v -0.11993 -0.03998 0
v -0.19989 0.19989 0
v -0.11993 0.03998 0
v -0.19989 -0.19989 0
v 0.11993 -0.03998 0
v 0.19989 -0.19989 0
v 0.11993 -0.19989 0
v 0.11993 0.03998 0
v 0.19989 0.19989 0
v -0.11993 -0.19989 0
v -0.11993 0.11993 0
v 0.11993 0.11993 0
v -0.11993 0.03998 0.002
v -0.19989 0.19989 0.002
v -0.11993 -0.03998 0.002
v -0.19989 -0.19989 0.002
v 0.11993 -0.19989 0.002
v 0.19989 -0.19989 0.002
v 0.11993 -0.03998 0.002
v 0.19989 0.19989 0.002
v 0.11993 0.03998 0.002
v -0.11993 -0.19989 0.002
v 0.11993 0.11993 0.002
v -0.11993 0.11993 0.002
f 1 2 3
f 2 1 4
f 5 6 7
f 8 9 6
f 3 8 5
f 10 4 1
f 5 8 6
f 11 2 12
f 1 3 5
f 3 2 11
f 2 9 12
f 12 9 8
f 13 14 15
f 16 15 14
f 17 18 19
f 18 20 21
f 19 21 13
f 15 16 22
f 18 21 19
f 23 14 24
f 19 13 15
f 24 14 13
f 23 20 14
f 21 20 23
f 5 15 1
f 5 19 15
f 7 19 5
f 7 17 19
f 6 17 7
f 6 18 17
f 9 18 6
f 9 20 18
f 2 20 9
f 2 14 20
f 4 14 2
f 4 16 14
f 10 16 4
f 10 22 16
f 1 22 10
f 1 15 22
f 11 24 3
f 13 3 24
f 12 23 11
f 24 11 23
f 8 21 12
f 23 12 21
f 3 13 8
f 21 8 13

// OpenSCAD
// file: text.scad
char_depth = 0.0001;

char_pixelsz = 0.02/5;
char_pheight = 5;
char_max_pwidth = 5;

function sum(list) = list * [for (_=list) 1];
function partialsum(list, end) = list * [for (i=[0:len(list)-1]) i < end ? 1 : 0];

module _Text_Line(a, b) {
  l = norm(b-a);
  f = l > 0 ? (b-a)/l : [1, 0];
  r = [f.y, -f.x];
  ea = -0.5*f;
  eb = (l+0.5)*f;
  sr = 0.5*r;
  sl = -sr;
  polygon([
    a+ea+sr,
    a+eb+sr,
    a+eb+sl,
    a+ea+sl,
  ]*char_pixelsz);
}

module _Text_Segments(pts, off=[0,0]) {
  for (i=[0:len(pts)-2]) {
    pa = pts[i];
    pb = pts[i+1];
    if (len(pa) == 2 && len(pb) == 2)
      _Text_Line(pts[i]+off, pts[i+1]+off);
  }
}

_Letters =
let(
  bl=[-2,-2],
  bc=[0,-2],
  br=[2,-2],
  cl=[-2,0],
  cc=[0,0],
  cr=[2,0],
  tl=[-2,2],
  tc=[0,2],
  tr=[2,2],
  _=[],
  hx=[0.5,0],
  hy=[0,0.5],
  x=[1,0],
  y=[0,1]
) [
  [bl, tl, tr, br, _, cl, cr], // A
  [cr+hy, br, bl, tl, tc+hx, _, cl, cr, _, tc+y, cr+x], // B
  [br, bl, tl, tr], // C
  [cr+hy, br, bl, tl, tc+hx, _, cr+x, tc+y], // D
  [br, bl, tl, tr, _, cl, cc], // E
  [tr, tl, bl, cl, cc], // F
  [cc, cr, br, bl, tl, tr], // G
  [bl, tl, cl, cr, tr, br], // H
  [bc, tc], // I
  [cl, bl, br, tr], // J
  [bl, tl, _, cl, cc, _, tr+hx+hy, cc, br+hx-hy], // K
  [tl, bl, br], // L
  [bl, tl, tr, br, _, bc, tc], // M
  [bl, tl, tr, br], // N
  [bl, tl, tr, br, bl], // O
  [bl, tl, tr, cr, cl], // P
  [bl, tl, tr, br, bl, _, cc+hx-hy, br], // Q
  [bl, tl, tr, cr, cl, bc+hx-hy], // R
  [bl, br, cr, cl, tl, tr], // S
  [tl, tr, _, bc, tc], // T
  [tl, bl, br, tr], // U
  [tl, cl, _, tr, cr, _, cl-x+hy, bc-hy, cr+x+hy], // V
  [tl, bl, br, tr, _, bc, tc], // W
  [bl-hx-hy, tr+hx+hy, _, tl-hx+hy, br+hx-hy], // X
  [tl, cl, cr, tr, _, bc, cc], // Y
  [br, bl+hx, _, bl-hx-hy, tr+hx+hy, _, tr-hx, tl], // Z
  [bl, tl, tr, br, bl, _, bl, tr], // 0
  [bc, tc, tc-x], // 1
  [tl, tr, cr, cl, bl, br], // 2
  [bl, br, tr, tl, _, cc, cr], // 3
  [tl, cl, cr, tr, br], // 4
  [tr, tl, cl, cr, cr-hy, _, cr+x, bc-y, _, bc+hx, bl], // 5
  [tr, tl, bl, br, cr, cl], // 6
  [tl, tr, br], // 7
  [bl, tl, tr, br, bl, cl, cr], // 8
  [br, tr, tl, cl, cr], // 9
  [tl, tr, cr, cc, _, bc, bc], // ? for missing
];

function _Letter_Lookup(c) =
  let(
    ci=ord(c),
    li=ci-ord("A"),
    ni=ci-ord("0"),
    issp=ci==32,
    lps=li>=0&&li<26 ? _Letters[li] : ni>=0&&ni<10 ? _Letters[ni+26] : [],
    lpf=len(lps)==0 ? _Letters[36] : lps
  ) issp ? [] : lpf;

function _Letter_Bounds(letter) =
  let(
    fletter = concat([[0, 0]], [for (l=letter) len(l)==2 ? l : [0,0]]),
    xs = [for (l=fletter) l.x],
    ys = [for (l=fletter) l.y],
    h_edge = (char_max_pwidth - 1) / 2,
    v_edge = (char_pheight - 1) / 2
  ) [
    max(min(xs), -h_edge),
    max(min(ys), -v_edge),
    min(max(xs), h_edge),
    min(max(ys), v_edge)
  ];

module Text(text) {
  letters = [for (c=text) _Letter_Lookup(c)];
  lbounds = [for (l=letters) _Letter_Bounds(l)];
  lwidths = [for (b=lbounds) min(b.z-b.x+1, char_max_pwidth)];
  lmins = [for (b=lbounds) b.x];
  twid = sum(lwidths) + len(letters)-1;
  startoff = (1-twid)/2;
  offs = [for (i=[0:len(letters)-1]) startoff+i+partialsum(lwidths, i)];
  linear_extrude(height=char_depth) {
    for (i=[0:len(letters)-1]) if (len(letters[i]) > 0) {
      letter = letters[i];
      off = offs[i];
      left = off-lmins[i];
      wid = lwidths[i];
      intersection() {
        _Text_Segments(letter, [left, 0]);
        scale([char_pixelsz,char_pixelsz]) translate([off-0.5, -char_pheight/2])
          square(size=[wid, char_pheight]);
      }
    }
  }
}

module TextLines(lines, spacing=3) {
  offset = (spacing+char_pheight)*char_pixelsz;
  totaloff = (len(lines)-1)*offset;
  first_off = totaloff/2;
  offs = [for (i=[0:len(lines)-1]) first_off-offset*i];
  for (i=[0:len(lines)-1]) translate([0,offs[i],0]) Text(lines[i]);
}
// main file
use <text.scad>;

if ($t < 0.5) {
  scale(20) Text("A");
} else {
  scale(2) Text("B");
}
